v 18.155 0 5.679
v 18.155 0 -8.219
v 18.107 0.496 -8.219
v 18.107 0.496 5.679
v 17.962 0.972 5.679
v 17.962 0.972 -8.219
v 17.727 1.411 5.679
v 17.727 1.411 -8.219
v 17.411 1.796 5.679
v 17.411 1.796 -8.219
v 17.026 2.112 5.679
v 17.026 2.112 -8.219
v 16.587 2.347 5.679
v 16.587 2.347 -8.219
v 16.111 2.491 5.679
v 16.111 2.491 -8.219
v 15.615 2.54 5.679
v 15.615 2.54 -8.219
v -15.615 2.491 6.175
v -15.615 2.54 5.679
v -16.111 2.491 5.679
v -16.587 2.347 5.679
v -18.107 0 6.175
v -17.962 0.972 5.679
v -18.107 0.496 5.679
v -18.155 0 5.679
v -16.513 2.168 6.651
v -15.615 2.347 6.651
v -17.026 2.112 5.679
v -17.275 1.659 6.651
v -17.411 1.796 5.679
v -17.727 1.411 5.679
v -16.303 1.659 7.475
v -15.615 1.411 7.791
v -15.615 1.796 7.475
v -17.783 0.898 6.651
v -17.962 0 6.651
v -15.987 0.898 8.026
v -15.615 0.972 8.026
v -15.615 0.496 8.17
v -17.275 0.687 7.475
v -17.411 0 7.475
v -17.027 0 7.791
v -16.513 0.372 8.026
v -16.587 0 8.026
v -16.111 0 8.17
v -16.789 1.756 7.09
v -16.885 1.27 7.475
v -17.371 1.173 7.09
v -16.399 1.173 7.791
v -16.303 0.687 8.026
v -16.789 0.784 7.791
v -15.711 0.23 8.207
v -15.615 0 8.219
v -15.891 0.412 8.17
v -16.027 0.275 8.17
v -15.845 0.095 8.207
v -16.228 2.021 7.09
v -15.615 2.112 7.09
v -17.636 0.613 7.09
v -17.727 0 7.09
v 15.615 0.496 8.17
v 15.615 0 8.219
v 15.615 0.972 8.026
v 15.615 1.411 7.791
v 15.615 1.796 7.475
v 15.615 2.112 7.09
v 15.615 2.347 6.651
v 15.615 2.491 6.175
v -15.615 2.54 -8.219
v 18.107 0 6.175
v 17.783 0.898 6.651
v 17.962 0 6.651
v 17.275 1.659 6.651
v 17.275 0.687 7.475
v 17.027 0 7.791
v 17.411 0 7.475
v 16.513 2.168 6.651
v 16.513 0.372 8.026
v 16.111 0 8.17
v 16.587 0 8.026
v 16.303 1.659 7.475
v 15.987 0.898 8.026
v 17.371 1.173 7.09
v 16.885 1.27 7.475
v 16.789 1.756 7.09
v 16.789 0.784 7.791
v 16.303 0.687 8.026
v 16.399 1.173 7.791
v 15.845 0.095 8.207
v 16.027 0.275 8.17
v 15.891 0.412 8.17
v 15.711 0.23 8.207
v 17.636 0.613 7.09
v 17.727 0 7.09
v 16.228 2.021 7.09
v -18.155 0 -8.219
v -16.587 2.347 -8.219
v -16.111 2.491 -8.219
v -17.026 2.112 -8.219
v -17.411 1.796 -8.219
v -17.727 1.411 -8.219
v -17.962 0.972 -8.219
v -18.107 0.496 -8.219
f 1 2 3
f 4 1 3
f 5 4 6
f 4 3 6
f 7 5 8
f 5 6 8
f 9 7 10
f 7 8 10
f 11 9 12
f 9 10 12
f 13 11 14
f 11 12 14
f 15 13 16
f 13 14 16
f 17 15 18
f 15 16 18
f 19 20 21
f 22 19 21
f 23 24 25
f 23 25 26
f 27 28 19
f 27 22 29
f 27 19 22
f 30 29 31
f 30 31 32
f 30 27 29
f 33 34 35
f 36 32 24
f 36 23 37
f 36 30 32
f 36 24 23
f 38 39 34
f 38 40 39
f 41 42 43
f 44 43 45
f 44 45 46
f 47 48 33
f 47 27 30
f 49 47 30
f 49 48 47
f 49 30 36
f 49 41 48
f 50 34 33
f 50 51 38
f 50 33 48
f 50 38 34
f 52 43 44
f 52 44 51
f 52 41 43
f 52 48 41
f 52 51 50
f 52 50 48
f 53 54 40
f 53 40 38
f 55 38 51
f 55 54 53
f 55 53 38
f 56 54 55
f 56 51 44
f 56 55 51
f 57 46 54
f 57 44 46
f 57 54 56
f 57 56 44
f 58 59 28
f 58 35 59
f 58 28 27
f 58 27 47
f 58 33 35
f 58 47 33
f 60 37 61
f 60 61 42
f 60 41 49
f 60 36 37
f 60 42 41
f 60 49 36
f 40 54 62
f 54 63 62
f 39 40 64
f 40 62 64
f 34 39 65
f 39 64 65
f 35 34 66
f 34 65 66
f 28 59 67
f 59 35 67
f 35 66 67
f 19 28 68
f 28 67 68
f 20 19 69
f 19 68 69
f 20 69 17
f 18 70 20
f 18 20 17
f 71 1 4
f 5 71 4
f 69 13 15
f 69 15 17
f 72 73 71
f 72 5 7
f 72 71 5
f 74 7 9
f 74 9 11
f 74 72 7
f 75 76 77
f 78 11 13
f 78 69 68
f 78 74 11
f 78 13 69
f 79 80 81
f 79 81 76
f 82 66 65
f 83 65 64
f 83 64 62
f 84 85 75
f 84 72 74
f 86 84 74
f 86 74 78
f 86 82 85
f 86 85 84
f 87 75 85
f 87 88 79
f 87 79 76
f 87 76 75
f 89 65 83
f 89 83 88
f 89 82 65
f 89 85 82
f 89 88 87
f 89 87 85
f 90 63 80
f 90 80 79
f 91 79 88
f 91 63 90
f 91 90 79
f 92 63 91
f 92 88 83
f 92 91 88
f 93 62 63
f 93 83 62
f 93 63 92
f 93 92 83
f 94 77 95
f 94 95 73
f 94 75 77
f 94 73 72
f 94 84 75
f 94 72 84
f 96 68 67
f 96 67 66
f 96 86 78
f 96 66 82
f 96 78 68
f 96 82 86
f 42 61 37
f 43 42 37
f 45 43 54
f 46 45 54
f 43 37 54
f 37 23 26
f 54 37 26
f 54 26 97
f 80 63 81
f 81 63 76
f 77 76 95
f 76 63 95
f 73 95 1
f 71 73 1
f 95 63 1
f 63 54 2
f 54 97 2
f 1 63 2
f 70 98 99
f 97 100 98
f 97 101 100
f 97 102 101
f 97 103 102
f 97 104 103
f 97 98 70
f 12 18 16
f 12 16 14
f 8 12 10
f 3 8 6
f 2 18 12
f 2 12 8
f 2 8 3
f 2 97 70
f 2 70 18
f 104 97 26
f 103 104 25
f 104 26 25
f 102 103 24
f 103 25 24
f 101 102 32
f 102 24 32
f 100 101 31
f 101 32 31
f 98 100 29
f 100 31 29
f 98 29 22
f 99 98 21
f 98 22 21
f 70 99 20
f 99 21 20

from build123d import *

# Parameters (mm, degrees)
SKETCH1_W           = 36.310674736
SKETCH1_H           = 16.43794059
BOSS_EXTRUDE1_DEPTH = 2.54
FILLET1_R           = 2.54
FILLET2_R           = 2.54


# Some blends are built 0.0001 mm under size
with BuildPart() as part:
    # Sketch1 → Boss-Extrude1 (new body)
    with BuildSketch(Plane(origin=(0, 0, 0), x_dir=(1, 0, 0), z_dir=(0, 1, 0))):
        Rectangle(SKETCH1_W, SKETCH1_H)
    extrude(amount=BOSS_EXTRUDE1_DEPTH)

    # Fillet1
    fillet1_edges = [part.edges().sort_by_distance(p)[0] for p in [
        (18.155337368, 1.27, 8.218970295),
        (-18.155337368, 1.27, 8.218970295),
        (0, 2.54, 8.218970295),
    ]]
    fillet(fillet1_edges, radius=FILLET1_R - 0.0001)  # a hair under: the kernel refuses the full size

    # Fillet2
    # the kernel refuses this fillet: 2.54 mm, written as the material it takes off along each edge
    with BuildSketch(Plane(origin=(-15.615337368, 0, 8.218970295), x_dir=(0, 1, 0), z_dir=(1, 0, 0))) as fillet2_piece_1:
        with BuildLine():
            CenterArc((0.0001, -2.5399), 2.5399, 0, 90)
            Line((2.54, -2.5399), (2.54, 0))
            Line((2.54, 0), (0.0001, 0))
        make_face()
    revolve(axis=Axis((-15.615337368, 0, 8.218970295), (0, 0, 1)), revolution_arc=90, mode=Mode.SUBTRACT)
    with BuildSketch(Plane(origin=(15.615337368, 0, 8.218970295), x_dir=(1, 0, 0), z_dir=(0, -1, 0))) as fillet2_piece_2:
        with BuildLine():
            CenterArc((0.0001, -2.5399), 2.5399, 0, 90)
            Line((2.54, -2.5399), (2.54, 0))
            Line((2.54, 0), (0.0001, 0))
        make_face()
    revolve(axis=Axis((15.615337368, 0, 8.218970295), (0, 0, 1)), revolution_arc=90, mode=Mode.SUBTRACT)
    with BuildSketch(Plane(origin=(-18.155337368, 2.54, 8.218970295), x_dir=(0, -1, 0), z_dir=(0, 0, -1)), Plane(origin=(18.155337368, 2.54, -14.568970295), x_dir=(0, -1, 0), z_dir=(0, 0, 1))) as fillet2_piece_3:
        with BuildLine():
            CenterArc((FILLET2_R, -FILLET2_R), FILLET2_R, 90, 90)
            Line((0, -FILLET2_R), (0, 0))
            Line((0, 0), (FILLET2_R, 0))
        make_face()
    extrude(amount=22.78794059, mode=Mode.SUBTRACT)


solid = part.part
